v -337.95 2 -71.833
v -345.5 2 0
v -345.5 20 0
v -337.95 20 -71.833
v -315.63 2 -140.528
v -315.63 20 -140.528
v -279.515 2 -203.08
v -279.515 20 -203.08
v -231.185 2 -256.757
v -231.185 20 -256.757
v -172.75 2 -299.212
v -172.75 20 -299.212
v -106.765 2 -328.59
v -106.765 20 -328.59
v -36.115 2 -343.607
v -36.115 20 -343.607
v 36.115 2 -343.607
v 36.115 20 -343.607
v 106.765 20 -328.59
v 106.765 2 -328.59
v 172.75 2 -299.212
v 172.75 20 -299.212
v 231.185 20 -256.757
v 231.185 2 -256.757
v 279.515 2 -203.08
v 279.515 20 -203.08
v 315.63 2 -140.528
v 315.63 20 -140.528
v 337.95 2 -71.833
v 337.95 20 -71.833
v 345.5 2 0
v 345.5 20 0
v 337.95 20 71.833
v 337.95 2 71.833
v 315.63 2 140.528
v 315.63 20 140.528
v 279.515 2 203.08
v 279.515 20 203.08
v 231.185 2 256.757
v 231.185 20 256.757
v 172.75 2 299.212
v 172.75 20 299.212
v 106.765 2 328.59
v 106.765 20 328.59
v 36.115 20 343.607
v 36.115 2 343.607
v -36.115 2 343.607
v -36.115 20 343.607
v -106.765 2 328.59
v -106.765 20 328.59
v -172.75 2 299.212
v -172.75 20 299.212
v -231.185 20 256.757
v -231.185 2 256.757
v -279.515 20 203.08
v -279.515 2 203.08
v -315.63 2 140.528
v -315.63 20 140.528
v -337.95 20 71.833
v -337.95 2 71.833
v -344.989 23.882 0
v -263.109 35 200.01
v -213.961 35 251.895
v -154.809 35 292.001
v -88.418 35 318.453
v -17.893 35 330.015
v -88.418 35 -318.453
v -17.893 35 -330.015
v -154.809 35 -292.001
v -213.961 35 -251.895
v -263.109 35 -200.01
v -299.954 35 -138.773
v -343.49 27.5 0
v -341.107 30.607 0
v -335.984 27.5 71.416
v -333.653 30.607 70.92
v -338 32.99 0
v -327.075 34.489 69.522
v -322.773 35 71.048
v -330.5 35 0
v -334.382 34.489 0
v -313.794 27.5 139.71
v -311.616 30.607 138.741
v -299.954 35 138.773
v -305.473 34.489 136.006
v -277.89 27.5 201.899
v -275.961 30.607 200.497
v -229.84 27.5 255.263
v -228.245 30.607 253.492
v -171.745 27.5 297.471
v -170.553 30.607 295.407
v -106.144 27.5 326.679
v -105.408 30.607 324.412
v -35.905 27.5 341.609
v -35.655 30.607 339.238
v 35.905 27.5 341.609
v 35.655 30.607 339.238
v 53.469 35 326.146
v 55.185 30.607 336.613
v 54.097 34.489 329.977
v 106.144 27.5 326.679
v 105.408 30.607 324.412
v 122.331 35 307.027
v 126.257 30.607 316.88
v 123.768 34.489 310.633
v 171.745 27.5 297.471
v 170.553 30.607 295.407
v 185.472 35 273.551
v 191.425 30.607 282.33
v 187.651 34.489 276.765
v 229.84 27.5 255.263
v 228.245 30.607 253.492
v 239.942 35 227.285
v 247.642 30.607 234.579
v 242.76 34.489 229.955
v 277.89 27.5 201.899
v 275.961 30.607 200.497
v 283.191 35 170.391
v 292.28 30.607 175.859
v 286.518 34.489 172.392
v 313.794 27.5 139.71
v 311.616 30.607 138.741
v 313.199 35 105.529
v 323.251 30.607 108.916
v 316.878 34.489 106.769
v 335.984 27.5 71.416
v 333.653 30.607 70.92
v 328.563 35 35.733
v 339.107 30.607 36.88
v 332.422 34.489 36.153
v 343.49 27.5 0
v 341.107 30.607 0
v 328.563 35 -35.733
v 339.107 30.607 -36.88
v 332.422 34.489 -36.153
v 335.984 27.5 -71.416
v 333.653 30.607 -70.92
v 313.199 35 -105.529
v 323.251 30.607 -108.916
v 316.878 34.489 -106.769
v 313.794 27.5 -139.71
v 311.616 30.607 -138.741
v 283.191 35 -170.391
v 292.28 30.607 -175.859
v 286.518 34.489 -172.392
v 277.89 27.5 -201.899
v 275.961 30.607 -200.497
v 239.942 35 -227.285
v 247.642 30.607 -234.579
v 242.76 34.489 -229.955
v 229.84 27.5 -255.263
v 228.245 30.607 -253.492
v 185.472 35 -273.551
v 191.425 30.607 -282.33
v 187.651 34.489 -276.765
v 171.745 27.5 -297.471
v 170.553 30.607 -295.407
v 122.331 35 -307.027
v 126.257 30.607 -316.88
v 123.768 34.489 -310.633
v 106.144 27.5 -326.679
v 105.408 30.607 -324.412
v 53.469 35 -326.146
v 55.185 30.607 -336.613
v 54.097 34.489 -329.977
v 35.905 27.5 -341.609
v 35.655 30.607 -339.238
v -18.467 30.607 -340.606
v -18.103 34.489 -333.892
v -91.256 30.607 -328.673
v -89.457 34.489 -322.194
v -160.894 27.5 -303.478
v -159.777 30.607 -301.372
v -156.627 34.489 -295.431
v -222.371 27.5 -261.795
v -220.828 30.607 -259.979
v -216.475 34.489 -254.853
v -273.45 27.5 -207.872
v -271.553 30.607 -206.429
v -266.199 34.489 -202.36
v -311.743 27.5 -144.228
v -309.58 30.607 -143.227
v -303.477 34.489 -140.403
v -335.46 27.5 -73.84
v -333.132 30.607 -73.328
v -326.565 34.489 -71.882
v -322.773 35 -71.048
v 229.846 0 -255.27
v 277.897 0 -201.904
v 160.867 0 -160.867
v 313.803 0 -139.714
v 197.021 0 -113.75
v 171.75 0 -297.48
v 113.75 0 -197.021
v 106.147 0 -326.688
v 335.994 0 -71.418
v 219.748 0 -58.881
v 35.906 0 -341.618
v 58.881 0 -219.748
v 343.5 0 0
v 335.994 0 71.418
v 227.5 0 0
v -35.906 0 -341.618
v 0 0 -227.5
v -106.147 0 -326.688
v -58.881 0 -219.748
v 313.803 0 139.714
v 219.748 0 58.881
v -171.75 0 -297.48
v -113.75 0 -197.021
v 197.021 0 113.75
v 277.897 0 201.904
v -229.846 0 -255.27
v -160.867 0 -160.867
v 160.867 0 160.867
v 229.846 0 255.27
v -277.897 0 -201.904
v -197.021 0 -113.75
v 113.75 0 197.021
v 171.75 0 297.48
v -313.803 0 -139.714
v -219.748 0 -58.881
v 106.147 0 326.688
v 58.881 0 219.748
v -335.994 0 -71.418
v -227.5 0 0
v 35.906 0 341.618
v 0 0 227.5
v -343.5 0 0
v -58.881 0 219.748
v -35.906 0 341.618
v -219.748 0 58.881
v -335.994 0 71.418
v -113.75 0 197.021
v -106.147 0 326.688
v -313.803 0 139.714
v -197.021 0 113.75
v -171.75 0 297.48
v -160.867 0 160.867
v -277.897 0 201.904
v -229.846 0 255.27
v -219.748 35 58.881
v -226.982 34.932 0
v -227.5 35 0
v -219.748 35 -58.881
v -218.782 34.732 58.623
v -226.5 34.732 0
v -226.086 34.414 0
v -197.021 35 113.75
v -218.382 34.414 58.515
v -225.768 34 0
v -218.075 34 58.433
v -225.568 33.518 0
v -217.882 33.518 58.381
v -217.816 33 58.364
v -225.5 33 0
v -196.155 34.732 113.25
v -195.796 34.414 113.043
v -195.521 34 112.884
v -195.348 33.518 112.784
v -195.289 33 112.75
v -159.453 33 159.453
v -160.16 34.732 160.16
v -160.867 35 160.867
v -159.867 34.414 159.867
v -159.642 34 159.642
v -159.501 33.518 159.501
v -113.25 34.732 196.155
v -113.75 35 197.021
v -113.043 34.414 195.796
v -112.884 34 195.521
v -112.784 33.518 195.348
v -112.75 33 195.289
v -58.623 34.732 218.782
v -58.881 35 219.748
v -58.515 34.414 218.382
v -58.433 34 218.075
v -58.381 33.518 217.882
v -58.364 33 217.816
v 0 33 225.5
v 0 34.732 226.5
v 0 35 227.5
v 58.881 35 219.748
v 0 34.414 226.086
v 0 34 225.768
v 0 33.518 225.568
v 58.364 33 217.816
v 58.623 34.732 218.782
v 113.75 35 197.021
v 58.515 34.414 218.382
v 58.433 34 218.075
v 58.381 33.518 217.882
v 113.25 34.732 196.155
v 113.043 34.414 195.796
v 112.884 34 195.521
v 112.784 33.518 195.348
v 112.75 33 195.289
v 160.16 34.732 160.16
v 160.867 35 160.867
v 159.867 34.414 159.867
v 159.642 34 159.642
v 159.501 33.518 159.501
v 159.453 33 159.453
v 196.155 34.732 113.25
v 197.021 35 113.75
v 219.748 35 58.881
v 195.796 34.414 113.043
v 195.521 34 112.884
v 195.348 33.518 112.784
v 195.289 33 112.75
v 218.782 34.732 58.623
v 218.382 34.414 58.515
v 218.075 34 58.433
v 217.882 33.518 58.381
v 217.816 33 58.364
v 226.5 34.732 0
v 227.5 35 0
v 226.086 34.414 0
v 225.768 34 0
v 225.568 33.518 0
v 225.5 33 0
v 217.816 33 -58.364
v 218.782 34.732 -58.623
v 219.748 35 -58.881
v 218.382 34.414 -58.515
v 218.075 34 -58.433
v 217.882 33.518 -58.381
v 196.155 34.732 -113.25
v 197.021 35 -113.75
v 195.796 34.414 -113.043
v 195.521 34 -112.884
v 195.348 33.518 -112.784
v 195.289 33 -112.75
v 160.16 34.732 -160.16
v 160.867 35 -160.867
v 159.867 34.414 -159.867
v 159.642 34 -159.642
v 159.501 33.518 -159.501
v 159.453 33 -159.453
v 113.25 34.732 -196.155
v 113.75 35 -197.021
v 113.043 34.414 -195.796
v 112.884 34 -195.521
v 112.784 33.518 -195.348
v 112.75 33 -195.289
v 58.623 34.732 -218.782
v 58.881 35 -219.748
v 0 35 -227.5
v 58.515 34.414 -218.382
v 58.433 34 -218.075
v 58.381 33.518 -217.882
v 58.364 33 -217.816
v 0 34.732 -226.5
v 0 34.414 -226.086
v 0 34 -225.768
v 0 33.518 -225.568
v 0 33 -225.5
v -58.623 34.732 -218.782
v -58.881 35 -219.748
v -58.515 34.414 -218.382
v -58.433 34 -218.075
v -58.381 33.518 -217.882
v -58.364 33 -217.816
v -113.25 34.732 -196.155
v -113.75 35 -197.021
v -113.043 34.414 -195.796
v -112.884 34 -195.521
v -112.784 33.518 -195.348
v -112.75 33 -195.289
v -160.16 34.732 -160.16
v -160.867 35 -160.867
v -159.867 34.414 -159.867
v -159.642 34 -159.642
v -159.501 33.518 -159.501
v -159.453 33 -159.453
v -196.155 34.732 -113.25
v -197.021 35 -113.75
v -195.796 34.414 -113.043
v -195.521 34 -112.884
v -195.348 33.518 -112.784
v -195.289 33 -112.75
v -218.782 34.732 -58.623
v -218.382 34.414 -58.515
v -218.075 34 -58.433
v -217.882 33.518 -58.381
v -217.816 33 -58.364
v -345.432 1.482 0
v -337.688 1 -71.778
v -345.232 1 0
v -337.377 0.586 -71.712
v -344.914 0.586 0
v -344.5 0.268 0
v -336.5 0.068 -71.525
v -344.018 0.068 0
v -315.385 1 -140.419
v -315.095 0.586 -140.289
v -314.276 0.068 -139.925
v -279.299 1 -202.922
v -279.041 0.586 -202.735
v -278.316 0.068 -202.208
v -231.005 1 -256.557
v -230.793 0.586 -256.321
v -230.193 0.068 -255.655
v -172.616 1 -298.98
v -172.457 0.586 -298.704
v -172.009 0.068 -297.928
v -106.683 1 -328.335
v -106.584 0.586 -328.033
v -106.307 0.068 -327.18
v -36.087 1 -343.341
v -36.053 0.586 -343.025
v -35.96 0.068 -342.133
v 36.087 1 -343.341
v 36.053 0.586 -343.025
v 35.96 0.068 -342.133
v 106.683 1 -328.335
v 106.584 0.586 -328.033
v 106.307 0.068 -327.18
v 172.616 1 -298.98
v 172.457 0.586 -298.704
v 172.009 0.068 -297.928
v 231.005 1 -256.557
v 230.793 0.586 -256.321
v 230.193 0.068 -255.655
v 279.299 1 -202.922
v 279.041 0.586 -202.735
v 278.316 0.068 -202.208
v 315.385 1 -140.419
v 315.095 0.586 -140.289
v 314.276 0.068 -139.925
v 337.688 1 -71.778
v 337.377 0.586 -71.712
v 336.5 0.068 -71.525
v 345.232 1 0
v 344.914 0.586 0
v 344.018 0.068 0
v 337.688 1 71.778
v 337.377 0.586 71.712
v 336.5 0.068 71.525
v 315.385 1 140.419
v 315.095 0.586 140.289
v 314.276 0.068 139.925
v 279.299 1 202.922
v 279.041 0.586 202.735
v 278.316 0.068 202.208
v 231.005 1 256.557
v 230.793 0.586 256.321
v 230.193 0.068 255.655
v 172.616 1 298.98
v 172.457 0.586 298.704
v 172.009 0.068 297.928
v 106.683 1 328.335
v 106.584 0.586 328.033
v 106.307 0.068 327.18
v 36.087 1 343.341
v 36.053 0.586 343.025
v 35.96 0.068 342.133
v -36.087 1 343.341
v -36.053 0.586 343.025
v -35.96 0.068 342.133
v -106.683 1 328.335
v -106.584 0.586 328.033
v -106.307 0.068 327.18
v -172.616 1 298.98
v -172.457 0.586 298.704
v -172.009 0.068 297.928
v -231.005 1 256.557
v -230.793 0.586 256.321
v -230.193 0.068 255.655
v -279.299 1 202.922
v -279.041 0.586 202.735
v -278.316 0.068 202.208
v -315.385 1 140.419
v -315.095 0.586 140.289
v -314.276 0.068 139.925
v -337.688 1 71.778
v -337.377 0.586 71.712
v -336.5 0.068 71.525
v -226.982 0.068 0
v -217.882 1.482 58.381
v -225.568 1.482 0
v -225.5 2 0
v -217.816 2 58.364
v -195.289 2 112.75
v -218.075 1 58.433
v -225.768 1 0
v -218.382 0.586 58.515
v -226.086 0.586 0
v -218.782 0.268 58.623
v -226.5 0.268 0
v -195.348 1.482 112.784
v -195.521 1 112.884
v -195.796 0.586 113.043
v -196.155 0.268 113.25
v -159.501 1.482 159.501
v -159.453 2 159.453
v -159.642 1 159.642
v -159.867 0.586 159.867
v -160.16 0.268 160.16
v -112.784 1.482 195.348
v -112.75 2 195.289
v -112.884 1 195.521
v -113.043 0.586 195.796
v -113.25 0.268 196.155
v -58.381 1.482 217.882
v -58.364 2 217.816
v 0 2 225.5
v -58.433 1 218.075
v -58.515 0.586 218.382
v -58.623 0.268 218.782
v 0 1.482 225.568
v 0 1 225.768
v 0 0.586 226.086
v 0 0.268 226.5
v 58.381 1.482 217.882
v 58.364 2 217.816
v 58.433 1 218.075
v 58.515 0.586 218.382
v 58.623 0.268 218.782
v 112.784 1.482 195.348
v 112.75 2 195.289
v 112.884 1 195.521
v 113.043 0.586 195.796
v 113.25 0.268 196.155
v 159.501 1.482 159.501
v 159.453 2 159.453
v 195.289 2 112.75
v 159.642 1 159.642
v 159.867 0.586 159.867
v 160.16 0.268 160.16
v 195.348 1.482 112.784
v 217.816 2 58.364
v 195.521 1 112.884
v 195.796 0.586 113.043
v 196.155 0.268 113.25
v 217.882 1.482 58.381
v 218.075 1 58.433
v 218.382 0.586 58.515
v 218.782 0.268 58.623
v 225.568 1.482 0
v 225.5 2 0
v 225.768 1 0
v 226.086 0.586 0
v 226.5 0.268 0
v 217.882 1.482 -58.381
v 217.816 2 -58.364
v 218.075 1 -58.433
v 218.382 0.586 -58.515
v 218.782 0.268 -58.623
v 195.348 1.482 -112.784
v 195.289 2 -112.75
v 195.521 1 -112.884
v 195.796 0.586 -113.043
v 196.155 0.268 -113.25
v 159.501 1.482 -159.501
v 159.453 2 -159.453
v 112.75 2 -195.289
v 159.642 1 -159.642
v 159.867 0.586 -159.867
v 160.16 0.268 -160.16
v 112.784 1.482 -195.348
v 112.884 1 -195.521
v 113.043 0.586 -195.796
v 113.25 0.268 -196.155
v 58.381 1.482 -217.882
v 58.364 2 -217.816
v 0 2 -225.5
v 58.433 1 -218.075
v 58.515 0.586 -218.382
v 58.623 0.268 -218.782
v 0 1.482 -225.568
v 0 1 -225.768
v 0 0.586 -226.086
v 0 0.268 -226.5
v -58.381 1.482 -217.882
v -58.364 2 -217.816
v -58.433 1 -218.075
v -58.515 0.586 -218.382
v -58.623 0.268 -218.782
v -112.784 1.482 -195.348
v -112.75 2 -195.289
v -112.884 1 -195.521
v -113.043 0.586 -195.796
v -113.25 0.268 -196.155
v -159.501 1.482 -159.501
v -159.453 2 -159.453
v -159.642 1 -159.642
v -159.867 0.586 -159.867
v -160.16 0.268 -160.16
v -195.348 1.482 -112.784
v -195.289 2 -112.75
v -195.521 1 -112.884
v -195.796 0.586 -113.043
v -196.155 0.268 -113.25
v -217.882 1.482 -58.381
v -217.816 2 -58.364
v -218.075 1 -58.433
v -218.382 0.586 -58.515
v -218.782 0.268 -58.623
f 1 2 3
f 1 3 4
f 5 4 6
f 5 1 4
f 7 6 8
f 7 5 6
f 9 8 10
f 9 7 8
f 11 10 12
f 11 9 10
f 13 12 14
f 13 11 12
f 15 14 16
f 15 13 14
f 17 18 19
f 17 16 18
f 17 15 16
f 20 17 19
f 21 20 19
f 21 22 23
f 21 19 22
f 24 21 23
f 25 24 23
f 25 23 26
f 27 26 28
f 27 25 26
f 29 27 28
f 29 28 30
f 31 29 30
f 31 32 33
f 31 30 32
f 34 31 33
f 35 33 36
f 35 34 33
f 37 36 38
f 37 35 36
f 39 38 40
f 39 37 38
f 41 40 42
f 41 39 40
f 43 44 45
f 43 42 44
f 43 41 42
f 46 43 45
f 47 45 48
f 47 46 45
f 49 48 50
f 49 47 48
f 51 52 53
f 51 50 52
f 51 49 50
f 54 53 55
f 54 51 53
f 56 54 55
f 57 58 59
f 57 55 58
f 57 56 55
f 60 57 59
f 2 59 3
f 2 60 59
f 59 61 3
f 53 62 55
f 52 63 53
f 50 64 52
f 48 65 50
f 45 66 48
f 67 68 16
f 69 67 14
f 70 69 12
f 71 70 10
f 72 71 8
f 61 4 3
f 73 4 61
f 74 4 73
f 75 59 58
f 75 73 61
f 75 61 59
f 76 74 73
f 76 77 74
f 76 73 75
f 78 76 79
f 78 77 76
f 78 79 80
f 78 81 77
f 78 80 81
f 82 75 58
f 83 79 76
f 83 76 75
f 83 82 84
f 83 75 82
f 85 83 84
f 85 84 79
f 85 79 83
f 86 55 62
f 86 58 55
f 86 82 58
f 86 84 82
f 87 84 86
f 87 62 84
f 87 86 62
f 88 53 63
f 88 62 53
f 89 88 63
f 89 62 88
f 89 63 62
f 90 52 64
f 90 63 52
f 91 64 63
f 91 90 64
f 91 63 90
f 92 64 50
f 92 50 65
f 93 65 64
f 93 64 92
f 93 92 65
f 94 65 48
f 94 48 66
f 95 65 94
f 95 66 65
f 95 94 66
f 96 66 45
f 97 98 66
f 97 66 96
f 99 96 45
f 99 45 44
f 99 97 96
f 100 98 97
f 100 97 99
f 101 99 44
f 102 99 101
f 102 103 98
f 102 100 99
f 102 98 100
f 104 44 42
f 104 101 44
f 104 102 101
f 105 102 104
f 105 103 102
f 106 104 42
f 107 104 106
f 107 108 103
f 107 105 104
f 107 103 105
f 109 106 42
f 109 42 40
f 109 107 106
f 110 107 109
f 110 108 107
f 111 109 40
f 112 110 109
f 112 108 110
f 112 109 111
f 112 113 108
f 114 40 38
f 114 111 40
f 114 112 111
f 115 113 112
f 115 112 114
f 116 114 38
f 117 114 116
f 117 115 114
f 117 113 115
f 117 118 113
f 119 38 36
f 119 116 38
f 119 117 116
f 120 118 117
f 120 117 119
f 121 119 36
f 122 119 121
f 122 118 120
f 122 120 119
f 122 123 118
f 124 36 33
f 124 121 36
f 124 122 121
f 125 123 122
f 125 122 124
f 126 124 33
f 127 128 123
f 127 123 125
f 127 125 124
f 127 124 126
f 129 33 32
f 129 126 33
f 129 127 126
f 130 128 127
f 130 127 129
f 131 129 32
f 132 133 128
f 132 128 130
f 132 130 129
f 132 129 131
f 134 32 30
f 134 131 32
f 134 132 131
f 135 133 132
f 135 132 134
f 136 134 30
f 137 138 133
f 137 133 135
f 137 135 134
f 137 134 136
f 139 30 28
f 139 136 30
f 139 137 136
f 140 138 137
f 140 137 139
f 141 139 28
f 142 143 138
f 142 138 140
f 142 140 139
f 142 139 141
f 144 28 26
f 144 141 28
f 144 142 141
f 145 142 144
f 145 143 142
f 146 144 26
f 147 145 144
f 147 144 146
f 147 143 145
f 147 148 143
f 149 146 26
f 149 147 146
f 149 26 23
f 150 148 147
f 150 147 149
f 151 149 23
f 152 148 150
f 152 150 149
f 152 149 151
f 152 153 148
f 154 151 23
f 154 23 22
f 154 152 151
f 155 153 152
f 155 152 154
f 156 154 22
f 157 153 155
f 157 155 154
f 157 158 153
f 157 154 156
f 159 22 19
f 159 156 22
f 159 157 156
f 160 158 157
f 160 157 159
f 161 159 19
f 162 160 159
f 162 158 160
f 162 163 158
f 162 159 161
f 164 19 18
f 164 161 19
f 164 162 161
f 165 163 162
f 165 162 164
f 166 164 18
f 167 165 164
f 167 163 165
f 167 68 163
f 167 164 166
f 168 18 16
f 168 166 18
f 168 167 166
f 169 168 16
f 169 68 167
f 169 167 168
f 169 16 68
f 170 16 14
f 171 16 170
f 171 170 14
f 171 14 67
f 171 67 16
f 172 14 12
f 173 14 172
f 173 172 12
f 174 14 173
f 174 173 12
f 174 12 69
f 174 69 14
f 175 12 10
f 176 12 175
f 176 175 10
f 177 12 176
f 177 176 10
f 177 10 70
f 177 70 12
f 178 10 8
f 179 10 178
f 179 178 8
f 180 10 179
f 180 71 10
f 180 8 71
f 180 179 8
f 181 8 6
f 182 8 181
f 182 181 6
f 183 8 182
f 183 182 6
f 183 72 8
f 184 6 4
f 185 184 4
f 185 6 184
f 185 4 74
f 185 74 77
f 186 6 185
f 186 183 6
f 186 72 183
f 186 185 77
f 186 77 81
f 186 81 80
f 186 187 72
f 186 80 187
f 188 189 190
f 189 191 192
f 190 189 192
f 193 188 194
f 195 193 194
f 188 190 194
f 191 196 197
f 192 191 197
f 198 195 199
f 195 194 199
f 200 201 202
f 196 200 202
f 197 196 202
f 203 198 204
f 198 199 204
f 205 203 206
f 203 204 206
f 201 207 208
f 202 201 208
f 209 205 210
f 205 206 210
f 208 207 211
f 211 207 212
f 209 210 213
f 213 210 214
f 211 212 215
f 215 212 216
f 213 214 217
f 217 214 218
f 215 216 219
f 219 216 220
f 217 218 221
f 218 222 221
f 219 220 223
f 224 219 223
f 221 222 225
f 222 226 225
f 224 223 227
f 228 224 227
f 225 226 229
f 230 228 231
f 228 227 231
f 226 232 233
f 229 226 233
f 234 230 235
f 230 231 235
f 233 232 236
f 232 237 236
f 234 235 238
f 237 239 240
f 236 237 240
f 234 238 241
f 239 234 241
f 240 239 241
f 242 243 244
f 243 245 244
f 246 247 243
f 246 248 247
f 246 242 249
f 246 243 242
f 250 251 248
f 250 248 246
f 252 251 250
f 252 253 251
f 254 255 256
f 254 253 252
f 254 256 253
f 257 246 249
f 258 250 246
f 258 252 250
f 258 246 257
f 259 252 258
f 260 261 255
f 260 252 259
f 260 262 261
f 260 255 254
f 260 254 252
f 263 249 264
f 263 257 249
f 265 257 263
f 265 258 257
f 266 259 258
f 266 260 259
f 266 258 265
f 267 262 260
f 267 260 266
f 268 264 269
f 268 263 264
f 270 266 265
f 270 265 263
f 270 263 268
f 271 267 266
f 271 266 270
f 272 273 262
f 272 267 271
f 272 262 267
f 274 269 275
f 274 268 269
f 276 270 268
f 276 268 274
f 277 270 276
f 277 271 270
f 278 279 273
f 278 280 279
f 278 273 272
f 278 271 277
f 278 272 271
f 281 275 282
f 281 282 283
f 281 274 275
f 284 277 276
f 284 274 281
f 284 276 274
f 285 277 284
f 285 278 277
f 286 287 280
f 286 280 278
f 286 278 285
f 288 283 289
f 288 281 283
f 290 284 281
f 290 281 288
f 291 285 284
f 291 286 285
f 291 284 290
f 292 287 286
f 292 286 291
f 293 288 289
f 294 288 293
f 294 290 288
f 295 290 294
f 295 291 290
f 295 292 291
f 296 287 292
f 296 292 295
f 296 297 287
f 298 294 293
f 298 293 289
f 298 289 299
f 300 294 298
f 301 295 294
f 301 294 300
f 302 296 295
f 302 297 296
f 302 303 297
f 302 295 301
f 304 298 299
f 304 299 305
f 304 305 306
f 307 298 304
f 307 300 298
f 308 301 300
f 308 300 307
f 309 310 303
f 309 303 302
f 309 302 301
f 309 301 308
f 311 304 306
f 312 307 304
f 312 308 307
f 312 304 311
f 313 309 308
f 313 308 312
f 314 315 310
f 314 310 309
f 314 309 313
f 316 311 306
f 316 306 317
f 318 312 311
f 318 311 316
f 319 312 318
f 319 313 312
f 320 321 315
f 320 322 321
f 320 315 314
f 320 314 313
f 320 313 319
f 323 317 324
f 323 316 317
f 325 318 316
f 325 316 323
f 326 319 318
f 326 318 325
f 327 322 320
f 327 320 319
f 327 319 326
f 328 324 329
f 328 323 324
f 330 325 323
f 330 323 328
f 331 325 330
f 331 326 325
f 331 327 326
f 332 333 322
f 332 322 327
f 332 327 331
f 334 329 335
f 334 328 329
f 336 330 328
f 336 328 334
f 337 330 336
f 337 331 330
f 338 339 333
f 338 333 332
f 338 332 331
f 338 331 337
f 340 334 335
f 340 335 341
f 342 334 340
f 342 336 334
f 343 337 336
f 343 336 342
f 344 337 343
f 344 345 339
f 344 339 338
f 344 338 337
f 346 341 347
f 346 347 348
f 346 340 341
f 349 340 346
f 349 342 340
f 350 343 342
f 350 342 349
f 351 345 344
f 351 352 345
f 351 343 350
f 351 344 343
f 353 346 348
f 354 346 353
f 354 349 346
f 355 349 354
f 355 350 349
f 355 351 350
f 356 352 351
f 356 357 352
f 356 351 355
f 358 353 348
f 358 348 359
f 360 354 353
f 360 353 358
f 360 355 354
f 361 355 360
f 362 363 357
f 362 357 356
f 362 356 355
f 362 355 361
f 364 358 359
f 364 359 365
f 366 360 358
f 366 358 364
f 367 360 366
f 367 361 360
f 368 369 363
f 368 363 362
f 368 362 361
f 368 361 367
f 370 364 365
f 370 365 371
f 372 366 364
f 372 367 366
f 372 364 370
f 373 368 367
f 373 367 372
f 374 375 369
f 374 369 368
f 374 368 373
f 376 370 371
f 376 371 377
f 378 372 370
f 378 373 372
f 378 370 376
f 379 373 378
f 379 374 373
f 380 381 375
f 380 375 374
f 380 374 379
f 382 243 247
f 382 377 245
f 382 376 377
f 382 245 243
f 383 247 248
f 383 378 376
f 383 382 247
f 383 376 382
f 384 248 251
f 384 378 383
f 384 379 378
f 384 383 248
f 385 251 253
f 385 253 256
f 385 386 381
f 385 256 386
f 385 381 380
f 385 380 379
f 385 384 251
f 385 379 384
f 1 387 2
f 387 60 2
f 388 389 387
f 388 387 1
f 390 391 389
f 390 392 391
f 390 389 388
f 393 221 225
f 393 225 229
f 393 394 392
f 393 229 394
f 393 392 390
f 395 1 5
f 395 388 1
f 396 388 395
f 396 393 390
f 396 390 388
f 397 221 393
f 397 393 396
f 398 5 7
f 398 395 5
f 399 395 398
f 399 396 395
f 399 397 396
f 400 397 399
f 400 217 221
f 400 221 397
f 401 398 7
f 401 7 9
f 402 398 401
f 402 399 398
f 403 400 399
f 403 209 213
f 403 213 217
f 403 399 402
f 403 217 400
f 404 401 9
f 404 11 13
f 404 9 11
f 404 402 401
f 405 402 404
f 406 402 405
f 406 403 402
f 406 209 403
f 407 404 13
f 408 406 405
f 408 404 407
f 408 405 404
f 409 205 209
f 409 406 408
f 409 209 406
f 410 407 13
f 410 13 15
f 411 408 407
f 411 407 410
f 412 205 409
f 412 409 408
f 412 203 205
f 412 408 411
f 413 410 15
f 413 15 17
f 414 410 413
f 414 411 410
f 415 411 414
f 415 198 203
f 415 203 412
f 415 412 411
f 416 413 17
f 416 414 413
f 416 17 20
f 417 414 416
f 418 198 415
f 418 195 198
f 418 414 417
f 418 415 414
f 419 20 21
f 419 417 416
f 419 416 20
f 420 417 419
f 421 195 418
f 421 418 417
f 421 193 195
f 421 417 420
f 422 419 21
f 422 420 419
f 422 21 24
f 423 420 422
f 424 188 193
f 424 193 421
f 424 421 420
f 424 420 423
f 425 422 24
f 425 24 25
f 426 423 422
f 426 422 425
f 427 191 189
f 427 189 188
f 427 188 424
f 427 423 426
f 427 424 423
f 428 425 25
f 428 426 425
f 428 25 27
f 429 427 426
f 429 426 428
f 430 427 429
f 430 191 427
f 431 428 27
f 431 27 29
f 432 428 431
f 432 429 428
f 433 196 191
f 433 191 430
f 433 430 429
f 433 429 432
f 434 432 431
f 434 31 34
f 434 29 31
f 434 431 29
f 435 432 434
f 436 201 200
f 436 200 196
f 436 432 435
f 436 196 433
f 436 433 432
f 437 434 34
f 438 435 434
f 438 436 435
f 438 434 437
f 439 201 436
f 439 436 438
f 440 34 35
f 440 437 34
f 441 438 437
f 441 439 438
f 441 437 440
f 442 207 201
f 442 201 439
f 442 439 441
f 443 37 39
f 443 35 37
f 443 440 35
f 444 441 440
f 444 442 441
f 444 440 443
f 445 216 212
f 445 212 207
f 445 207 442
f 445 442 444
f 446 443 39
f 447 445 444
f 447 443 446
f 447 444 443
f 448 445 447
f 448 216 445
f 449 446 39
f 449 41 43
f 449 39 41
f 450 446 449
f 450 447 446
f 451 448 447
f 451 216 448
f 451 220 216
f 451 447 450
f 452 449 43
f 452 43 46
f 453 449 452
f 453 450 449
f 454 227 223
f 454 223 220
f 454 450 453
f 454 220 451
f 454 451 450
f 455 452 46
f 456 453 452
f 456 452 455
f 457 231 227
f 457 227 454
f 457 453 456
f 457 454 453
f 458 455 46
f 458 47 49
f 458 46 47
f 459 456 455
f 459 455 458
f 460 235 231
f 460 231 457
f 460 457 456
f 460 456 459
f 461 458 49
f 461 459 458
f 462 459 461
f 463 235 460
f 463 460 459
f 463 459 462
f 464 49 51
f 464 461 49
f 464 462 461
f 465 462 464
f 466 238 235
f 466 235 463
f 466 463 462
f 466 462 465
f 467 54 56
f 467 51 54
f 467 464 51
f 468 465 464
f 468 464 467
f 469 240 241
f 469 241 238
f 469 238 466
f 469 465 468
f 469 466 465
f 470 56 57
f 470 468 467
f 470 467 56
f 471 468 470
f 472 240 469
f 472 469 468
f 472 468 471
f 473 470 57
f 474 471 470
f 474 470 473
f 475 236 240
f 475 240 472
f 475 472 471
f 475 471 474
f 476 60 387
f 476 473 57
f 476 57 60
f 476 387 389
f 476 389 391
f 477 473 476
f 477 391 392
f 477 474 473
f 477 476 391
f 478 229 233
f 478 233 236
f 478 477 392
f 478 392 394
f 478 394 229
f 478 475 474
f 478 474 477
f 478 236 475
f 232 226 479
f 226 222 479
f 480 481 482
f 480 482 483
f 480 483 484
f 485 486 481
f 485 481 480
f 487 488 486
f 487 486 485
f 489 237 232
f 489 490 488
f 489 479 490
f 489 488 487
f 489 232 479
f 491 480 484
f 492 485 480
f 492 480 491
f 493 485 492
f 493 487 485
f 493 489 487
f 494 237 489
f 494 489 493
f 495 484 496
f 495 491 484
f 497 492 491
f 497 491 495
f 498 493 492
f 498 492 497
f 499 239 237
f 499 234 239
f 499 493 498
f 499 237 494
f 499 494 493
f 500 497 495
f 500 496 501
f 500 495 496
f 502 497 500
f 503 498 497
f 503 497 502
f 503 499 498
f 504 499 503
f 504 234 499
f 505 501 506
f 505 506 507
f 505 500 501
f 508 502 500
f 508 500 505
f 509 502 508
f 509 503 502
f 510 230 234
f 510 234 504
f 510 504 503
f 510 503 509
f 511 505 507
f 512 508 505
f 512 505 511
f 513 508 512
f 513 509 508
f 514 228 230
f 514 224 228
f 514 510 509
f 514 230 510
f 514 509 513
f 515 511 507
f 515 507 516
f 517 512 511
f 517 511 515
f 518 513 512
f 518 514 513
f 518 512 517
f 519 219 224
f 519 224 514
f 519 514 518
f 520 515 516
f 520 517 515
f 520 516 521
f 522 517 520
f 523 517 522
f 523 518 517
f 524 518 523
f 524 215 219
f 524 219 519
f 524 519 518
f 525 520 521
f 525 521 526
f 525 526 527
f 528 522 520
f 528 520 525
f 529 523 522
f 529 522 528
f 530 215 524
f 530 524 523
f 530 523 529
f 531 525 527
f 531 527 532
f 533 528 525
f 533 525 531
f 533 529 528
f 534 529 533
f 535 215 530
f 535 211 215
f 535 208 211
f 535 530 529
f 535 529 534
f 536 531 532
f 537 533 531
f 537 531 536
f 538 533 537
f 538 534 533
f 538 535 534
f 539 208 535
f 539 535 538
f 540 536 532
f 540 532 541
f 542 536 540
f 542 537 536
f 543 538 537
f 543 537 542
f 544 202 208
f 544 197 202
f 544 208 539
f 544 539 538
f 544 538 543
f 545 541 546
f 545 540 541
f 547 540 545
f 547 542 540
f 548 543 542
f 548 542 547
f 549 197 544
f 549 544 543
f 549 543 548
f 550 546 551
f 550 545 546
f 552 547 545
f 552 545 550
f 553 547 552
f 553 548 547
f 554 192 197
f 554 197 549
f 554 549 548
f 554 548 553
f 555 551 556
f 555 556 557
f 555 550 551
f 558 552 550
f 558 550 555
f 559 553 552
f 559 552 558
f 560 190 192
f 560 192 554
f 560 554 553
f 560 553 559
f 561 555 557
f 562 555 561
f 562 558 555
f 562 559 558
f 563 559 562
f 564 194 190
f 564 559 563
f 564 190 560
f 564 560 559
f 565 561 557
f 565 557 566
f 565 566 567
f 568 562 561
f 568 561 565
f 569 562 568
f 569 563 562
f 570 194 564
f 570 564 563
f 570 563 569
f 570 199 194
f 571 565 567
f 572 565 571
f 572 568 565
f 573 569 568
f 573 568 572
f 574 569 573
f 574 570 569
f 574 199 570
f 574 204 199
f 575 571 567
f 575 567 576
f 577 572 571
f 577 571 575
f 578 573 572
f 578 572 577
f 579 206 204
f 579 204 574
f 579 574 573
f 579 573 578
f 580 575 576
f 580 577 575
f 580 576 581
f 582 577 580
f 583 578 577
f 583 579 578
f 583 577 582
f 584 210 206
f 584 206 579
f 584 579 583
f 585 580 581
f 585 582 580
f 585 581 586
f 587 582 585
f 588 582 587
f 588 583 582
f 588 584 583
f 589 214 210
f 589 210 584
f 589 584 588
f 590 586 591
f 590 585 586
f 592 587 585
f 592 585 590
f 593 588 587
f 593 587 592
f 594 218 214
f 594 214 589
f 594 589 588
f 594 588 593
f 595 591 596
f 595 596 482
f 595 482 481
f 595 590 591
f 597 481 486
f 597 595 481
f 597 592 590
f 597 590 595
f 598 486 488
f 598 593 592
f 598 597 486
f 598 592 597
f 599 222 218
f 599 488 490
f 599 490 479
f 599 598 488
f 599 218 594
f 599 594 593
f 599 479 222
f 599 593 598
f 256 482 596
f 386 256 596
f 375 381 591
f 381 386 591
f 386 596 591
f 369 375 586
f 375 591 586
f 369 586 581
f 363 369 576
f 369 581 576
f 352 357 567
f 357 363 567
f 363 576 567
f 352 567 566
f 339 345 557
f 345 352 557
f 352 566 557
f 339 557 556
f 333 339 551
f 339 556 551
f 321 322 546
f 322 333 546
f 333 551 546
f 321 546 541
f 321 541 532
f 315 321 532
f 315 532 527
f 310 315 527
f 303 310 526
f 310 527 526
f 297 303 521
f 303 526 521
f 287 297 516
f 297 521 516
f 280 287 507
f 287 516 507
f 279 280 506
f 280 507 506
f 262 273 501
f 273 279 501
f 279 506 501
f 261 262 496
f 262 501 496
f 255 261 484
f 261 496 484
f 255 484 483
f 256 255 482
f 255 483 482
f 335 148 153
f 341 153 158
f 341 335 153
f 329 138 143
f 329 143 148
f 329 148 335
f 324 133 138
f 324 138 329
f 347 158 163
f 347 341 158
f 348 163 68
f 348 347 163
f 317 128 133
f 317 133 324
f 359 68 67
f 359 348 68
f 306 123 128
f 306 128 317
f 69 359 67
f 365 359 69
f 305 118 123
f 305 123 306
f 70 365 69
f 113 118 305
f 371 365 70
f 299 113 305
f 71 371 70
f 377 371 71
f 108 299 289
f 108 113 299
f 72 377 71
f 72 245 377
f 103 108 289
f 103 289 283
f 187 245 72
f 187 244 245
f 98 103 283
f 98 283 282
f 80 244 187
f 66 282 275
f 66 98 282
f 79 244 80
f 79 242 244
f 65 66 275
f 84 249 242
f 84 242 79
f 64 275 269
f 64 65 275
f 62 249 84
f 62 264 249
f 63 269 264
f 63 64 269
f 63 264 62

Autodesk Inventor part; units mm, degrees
ref_plane "YZ Plane" through (0, 0, 0) normal (1, 0, 0) x (0, 1, 0)
ref_plane "XZ Plane" through (0, 0, 0) normal (0, 1, 0) x (-1, 0, 0)
ref_plane "XY Plane" through (0, 0, 0) normal (0, 0, 1) x (1, 0, 0)
sketch "Skizze1" plane through (0, 0, 0) normal (0, 1, 0) x (-1, 0, 0)
  circle A0 centre (0, 0) radius 225.5
  circle A1 centre (0, 0) radius 345.5
  dimension "d0" = 120
  dimension "d1" = 451
extrude "Extrusion1" add sketch "Skizze1" along normal blind 35
fillet "Rundung1" radius 15 1 edges at (345.5, 35, 0)
fillet "Rundung2" radius 2 1 edges at (225.5, 35, 0)
fillet "Rundung3" radius 2 2 edges at (345.5, 0, 0) (225.5, 0, 0)
properties part number "Surround"
